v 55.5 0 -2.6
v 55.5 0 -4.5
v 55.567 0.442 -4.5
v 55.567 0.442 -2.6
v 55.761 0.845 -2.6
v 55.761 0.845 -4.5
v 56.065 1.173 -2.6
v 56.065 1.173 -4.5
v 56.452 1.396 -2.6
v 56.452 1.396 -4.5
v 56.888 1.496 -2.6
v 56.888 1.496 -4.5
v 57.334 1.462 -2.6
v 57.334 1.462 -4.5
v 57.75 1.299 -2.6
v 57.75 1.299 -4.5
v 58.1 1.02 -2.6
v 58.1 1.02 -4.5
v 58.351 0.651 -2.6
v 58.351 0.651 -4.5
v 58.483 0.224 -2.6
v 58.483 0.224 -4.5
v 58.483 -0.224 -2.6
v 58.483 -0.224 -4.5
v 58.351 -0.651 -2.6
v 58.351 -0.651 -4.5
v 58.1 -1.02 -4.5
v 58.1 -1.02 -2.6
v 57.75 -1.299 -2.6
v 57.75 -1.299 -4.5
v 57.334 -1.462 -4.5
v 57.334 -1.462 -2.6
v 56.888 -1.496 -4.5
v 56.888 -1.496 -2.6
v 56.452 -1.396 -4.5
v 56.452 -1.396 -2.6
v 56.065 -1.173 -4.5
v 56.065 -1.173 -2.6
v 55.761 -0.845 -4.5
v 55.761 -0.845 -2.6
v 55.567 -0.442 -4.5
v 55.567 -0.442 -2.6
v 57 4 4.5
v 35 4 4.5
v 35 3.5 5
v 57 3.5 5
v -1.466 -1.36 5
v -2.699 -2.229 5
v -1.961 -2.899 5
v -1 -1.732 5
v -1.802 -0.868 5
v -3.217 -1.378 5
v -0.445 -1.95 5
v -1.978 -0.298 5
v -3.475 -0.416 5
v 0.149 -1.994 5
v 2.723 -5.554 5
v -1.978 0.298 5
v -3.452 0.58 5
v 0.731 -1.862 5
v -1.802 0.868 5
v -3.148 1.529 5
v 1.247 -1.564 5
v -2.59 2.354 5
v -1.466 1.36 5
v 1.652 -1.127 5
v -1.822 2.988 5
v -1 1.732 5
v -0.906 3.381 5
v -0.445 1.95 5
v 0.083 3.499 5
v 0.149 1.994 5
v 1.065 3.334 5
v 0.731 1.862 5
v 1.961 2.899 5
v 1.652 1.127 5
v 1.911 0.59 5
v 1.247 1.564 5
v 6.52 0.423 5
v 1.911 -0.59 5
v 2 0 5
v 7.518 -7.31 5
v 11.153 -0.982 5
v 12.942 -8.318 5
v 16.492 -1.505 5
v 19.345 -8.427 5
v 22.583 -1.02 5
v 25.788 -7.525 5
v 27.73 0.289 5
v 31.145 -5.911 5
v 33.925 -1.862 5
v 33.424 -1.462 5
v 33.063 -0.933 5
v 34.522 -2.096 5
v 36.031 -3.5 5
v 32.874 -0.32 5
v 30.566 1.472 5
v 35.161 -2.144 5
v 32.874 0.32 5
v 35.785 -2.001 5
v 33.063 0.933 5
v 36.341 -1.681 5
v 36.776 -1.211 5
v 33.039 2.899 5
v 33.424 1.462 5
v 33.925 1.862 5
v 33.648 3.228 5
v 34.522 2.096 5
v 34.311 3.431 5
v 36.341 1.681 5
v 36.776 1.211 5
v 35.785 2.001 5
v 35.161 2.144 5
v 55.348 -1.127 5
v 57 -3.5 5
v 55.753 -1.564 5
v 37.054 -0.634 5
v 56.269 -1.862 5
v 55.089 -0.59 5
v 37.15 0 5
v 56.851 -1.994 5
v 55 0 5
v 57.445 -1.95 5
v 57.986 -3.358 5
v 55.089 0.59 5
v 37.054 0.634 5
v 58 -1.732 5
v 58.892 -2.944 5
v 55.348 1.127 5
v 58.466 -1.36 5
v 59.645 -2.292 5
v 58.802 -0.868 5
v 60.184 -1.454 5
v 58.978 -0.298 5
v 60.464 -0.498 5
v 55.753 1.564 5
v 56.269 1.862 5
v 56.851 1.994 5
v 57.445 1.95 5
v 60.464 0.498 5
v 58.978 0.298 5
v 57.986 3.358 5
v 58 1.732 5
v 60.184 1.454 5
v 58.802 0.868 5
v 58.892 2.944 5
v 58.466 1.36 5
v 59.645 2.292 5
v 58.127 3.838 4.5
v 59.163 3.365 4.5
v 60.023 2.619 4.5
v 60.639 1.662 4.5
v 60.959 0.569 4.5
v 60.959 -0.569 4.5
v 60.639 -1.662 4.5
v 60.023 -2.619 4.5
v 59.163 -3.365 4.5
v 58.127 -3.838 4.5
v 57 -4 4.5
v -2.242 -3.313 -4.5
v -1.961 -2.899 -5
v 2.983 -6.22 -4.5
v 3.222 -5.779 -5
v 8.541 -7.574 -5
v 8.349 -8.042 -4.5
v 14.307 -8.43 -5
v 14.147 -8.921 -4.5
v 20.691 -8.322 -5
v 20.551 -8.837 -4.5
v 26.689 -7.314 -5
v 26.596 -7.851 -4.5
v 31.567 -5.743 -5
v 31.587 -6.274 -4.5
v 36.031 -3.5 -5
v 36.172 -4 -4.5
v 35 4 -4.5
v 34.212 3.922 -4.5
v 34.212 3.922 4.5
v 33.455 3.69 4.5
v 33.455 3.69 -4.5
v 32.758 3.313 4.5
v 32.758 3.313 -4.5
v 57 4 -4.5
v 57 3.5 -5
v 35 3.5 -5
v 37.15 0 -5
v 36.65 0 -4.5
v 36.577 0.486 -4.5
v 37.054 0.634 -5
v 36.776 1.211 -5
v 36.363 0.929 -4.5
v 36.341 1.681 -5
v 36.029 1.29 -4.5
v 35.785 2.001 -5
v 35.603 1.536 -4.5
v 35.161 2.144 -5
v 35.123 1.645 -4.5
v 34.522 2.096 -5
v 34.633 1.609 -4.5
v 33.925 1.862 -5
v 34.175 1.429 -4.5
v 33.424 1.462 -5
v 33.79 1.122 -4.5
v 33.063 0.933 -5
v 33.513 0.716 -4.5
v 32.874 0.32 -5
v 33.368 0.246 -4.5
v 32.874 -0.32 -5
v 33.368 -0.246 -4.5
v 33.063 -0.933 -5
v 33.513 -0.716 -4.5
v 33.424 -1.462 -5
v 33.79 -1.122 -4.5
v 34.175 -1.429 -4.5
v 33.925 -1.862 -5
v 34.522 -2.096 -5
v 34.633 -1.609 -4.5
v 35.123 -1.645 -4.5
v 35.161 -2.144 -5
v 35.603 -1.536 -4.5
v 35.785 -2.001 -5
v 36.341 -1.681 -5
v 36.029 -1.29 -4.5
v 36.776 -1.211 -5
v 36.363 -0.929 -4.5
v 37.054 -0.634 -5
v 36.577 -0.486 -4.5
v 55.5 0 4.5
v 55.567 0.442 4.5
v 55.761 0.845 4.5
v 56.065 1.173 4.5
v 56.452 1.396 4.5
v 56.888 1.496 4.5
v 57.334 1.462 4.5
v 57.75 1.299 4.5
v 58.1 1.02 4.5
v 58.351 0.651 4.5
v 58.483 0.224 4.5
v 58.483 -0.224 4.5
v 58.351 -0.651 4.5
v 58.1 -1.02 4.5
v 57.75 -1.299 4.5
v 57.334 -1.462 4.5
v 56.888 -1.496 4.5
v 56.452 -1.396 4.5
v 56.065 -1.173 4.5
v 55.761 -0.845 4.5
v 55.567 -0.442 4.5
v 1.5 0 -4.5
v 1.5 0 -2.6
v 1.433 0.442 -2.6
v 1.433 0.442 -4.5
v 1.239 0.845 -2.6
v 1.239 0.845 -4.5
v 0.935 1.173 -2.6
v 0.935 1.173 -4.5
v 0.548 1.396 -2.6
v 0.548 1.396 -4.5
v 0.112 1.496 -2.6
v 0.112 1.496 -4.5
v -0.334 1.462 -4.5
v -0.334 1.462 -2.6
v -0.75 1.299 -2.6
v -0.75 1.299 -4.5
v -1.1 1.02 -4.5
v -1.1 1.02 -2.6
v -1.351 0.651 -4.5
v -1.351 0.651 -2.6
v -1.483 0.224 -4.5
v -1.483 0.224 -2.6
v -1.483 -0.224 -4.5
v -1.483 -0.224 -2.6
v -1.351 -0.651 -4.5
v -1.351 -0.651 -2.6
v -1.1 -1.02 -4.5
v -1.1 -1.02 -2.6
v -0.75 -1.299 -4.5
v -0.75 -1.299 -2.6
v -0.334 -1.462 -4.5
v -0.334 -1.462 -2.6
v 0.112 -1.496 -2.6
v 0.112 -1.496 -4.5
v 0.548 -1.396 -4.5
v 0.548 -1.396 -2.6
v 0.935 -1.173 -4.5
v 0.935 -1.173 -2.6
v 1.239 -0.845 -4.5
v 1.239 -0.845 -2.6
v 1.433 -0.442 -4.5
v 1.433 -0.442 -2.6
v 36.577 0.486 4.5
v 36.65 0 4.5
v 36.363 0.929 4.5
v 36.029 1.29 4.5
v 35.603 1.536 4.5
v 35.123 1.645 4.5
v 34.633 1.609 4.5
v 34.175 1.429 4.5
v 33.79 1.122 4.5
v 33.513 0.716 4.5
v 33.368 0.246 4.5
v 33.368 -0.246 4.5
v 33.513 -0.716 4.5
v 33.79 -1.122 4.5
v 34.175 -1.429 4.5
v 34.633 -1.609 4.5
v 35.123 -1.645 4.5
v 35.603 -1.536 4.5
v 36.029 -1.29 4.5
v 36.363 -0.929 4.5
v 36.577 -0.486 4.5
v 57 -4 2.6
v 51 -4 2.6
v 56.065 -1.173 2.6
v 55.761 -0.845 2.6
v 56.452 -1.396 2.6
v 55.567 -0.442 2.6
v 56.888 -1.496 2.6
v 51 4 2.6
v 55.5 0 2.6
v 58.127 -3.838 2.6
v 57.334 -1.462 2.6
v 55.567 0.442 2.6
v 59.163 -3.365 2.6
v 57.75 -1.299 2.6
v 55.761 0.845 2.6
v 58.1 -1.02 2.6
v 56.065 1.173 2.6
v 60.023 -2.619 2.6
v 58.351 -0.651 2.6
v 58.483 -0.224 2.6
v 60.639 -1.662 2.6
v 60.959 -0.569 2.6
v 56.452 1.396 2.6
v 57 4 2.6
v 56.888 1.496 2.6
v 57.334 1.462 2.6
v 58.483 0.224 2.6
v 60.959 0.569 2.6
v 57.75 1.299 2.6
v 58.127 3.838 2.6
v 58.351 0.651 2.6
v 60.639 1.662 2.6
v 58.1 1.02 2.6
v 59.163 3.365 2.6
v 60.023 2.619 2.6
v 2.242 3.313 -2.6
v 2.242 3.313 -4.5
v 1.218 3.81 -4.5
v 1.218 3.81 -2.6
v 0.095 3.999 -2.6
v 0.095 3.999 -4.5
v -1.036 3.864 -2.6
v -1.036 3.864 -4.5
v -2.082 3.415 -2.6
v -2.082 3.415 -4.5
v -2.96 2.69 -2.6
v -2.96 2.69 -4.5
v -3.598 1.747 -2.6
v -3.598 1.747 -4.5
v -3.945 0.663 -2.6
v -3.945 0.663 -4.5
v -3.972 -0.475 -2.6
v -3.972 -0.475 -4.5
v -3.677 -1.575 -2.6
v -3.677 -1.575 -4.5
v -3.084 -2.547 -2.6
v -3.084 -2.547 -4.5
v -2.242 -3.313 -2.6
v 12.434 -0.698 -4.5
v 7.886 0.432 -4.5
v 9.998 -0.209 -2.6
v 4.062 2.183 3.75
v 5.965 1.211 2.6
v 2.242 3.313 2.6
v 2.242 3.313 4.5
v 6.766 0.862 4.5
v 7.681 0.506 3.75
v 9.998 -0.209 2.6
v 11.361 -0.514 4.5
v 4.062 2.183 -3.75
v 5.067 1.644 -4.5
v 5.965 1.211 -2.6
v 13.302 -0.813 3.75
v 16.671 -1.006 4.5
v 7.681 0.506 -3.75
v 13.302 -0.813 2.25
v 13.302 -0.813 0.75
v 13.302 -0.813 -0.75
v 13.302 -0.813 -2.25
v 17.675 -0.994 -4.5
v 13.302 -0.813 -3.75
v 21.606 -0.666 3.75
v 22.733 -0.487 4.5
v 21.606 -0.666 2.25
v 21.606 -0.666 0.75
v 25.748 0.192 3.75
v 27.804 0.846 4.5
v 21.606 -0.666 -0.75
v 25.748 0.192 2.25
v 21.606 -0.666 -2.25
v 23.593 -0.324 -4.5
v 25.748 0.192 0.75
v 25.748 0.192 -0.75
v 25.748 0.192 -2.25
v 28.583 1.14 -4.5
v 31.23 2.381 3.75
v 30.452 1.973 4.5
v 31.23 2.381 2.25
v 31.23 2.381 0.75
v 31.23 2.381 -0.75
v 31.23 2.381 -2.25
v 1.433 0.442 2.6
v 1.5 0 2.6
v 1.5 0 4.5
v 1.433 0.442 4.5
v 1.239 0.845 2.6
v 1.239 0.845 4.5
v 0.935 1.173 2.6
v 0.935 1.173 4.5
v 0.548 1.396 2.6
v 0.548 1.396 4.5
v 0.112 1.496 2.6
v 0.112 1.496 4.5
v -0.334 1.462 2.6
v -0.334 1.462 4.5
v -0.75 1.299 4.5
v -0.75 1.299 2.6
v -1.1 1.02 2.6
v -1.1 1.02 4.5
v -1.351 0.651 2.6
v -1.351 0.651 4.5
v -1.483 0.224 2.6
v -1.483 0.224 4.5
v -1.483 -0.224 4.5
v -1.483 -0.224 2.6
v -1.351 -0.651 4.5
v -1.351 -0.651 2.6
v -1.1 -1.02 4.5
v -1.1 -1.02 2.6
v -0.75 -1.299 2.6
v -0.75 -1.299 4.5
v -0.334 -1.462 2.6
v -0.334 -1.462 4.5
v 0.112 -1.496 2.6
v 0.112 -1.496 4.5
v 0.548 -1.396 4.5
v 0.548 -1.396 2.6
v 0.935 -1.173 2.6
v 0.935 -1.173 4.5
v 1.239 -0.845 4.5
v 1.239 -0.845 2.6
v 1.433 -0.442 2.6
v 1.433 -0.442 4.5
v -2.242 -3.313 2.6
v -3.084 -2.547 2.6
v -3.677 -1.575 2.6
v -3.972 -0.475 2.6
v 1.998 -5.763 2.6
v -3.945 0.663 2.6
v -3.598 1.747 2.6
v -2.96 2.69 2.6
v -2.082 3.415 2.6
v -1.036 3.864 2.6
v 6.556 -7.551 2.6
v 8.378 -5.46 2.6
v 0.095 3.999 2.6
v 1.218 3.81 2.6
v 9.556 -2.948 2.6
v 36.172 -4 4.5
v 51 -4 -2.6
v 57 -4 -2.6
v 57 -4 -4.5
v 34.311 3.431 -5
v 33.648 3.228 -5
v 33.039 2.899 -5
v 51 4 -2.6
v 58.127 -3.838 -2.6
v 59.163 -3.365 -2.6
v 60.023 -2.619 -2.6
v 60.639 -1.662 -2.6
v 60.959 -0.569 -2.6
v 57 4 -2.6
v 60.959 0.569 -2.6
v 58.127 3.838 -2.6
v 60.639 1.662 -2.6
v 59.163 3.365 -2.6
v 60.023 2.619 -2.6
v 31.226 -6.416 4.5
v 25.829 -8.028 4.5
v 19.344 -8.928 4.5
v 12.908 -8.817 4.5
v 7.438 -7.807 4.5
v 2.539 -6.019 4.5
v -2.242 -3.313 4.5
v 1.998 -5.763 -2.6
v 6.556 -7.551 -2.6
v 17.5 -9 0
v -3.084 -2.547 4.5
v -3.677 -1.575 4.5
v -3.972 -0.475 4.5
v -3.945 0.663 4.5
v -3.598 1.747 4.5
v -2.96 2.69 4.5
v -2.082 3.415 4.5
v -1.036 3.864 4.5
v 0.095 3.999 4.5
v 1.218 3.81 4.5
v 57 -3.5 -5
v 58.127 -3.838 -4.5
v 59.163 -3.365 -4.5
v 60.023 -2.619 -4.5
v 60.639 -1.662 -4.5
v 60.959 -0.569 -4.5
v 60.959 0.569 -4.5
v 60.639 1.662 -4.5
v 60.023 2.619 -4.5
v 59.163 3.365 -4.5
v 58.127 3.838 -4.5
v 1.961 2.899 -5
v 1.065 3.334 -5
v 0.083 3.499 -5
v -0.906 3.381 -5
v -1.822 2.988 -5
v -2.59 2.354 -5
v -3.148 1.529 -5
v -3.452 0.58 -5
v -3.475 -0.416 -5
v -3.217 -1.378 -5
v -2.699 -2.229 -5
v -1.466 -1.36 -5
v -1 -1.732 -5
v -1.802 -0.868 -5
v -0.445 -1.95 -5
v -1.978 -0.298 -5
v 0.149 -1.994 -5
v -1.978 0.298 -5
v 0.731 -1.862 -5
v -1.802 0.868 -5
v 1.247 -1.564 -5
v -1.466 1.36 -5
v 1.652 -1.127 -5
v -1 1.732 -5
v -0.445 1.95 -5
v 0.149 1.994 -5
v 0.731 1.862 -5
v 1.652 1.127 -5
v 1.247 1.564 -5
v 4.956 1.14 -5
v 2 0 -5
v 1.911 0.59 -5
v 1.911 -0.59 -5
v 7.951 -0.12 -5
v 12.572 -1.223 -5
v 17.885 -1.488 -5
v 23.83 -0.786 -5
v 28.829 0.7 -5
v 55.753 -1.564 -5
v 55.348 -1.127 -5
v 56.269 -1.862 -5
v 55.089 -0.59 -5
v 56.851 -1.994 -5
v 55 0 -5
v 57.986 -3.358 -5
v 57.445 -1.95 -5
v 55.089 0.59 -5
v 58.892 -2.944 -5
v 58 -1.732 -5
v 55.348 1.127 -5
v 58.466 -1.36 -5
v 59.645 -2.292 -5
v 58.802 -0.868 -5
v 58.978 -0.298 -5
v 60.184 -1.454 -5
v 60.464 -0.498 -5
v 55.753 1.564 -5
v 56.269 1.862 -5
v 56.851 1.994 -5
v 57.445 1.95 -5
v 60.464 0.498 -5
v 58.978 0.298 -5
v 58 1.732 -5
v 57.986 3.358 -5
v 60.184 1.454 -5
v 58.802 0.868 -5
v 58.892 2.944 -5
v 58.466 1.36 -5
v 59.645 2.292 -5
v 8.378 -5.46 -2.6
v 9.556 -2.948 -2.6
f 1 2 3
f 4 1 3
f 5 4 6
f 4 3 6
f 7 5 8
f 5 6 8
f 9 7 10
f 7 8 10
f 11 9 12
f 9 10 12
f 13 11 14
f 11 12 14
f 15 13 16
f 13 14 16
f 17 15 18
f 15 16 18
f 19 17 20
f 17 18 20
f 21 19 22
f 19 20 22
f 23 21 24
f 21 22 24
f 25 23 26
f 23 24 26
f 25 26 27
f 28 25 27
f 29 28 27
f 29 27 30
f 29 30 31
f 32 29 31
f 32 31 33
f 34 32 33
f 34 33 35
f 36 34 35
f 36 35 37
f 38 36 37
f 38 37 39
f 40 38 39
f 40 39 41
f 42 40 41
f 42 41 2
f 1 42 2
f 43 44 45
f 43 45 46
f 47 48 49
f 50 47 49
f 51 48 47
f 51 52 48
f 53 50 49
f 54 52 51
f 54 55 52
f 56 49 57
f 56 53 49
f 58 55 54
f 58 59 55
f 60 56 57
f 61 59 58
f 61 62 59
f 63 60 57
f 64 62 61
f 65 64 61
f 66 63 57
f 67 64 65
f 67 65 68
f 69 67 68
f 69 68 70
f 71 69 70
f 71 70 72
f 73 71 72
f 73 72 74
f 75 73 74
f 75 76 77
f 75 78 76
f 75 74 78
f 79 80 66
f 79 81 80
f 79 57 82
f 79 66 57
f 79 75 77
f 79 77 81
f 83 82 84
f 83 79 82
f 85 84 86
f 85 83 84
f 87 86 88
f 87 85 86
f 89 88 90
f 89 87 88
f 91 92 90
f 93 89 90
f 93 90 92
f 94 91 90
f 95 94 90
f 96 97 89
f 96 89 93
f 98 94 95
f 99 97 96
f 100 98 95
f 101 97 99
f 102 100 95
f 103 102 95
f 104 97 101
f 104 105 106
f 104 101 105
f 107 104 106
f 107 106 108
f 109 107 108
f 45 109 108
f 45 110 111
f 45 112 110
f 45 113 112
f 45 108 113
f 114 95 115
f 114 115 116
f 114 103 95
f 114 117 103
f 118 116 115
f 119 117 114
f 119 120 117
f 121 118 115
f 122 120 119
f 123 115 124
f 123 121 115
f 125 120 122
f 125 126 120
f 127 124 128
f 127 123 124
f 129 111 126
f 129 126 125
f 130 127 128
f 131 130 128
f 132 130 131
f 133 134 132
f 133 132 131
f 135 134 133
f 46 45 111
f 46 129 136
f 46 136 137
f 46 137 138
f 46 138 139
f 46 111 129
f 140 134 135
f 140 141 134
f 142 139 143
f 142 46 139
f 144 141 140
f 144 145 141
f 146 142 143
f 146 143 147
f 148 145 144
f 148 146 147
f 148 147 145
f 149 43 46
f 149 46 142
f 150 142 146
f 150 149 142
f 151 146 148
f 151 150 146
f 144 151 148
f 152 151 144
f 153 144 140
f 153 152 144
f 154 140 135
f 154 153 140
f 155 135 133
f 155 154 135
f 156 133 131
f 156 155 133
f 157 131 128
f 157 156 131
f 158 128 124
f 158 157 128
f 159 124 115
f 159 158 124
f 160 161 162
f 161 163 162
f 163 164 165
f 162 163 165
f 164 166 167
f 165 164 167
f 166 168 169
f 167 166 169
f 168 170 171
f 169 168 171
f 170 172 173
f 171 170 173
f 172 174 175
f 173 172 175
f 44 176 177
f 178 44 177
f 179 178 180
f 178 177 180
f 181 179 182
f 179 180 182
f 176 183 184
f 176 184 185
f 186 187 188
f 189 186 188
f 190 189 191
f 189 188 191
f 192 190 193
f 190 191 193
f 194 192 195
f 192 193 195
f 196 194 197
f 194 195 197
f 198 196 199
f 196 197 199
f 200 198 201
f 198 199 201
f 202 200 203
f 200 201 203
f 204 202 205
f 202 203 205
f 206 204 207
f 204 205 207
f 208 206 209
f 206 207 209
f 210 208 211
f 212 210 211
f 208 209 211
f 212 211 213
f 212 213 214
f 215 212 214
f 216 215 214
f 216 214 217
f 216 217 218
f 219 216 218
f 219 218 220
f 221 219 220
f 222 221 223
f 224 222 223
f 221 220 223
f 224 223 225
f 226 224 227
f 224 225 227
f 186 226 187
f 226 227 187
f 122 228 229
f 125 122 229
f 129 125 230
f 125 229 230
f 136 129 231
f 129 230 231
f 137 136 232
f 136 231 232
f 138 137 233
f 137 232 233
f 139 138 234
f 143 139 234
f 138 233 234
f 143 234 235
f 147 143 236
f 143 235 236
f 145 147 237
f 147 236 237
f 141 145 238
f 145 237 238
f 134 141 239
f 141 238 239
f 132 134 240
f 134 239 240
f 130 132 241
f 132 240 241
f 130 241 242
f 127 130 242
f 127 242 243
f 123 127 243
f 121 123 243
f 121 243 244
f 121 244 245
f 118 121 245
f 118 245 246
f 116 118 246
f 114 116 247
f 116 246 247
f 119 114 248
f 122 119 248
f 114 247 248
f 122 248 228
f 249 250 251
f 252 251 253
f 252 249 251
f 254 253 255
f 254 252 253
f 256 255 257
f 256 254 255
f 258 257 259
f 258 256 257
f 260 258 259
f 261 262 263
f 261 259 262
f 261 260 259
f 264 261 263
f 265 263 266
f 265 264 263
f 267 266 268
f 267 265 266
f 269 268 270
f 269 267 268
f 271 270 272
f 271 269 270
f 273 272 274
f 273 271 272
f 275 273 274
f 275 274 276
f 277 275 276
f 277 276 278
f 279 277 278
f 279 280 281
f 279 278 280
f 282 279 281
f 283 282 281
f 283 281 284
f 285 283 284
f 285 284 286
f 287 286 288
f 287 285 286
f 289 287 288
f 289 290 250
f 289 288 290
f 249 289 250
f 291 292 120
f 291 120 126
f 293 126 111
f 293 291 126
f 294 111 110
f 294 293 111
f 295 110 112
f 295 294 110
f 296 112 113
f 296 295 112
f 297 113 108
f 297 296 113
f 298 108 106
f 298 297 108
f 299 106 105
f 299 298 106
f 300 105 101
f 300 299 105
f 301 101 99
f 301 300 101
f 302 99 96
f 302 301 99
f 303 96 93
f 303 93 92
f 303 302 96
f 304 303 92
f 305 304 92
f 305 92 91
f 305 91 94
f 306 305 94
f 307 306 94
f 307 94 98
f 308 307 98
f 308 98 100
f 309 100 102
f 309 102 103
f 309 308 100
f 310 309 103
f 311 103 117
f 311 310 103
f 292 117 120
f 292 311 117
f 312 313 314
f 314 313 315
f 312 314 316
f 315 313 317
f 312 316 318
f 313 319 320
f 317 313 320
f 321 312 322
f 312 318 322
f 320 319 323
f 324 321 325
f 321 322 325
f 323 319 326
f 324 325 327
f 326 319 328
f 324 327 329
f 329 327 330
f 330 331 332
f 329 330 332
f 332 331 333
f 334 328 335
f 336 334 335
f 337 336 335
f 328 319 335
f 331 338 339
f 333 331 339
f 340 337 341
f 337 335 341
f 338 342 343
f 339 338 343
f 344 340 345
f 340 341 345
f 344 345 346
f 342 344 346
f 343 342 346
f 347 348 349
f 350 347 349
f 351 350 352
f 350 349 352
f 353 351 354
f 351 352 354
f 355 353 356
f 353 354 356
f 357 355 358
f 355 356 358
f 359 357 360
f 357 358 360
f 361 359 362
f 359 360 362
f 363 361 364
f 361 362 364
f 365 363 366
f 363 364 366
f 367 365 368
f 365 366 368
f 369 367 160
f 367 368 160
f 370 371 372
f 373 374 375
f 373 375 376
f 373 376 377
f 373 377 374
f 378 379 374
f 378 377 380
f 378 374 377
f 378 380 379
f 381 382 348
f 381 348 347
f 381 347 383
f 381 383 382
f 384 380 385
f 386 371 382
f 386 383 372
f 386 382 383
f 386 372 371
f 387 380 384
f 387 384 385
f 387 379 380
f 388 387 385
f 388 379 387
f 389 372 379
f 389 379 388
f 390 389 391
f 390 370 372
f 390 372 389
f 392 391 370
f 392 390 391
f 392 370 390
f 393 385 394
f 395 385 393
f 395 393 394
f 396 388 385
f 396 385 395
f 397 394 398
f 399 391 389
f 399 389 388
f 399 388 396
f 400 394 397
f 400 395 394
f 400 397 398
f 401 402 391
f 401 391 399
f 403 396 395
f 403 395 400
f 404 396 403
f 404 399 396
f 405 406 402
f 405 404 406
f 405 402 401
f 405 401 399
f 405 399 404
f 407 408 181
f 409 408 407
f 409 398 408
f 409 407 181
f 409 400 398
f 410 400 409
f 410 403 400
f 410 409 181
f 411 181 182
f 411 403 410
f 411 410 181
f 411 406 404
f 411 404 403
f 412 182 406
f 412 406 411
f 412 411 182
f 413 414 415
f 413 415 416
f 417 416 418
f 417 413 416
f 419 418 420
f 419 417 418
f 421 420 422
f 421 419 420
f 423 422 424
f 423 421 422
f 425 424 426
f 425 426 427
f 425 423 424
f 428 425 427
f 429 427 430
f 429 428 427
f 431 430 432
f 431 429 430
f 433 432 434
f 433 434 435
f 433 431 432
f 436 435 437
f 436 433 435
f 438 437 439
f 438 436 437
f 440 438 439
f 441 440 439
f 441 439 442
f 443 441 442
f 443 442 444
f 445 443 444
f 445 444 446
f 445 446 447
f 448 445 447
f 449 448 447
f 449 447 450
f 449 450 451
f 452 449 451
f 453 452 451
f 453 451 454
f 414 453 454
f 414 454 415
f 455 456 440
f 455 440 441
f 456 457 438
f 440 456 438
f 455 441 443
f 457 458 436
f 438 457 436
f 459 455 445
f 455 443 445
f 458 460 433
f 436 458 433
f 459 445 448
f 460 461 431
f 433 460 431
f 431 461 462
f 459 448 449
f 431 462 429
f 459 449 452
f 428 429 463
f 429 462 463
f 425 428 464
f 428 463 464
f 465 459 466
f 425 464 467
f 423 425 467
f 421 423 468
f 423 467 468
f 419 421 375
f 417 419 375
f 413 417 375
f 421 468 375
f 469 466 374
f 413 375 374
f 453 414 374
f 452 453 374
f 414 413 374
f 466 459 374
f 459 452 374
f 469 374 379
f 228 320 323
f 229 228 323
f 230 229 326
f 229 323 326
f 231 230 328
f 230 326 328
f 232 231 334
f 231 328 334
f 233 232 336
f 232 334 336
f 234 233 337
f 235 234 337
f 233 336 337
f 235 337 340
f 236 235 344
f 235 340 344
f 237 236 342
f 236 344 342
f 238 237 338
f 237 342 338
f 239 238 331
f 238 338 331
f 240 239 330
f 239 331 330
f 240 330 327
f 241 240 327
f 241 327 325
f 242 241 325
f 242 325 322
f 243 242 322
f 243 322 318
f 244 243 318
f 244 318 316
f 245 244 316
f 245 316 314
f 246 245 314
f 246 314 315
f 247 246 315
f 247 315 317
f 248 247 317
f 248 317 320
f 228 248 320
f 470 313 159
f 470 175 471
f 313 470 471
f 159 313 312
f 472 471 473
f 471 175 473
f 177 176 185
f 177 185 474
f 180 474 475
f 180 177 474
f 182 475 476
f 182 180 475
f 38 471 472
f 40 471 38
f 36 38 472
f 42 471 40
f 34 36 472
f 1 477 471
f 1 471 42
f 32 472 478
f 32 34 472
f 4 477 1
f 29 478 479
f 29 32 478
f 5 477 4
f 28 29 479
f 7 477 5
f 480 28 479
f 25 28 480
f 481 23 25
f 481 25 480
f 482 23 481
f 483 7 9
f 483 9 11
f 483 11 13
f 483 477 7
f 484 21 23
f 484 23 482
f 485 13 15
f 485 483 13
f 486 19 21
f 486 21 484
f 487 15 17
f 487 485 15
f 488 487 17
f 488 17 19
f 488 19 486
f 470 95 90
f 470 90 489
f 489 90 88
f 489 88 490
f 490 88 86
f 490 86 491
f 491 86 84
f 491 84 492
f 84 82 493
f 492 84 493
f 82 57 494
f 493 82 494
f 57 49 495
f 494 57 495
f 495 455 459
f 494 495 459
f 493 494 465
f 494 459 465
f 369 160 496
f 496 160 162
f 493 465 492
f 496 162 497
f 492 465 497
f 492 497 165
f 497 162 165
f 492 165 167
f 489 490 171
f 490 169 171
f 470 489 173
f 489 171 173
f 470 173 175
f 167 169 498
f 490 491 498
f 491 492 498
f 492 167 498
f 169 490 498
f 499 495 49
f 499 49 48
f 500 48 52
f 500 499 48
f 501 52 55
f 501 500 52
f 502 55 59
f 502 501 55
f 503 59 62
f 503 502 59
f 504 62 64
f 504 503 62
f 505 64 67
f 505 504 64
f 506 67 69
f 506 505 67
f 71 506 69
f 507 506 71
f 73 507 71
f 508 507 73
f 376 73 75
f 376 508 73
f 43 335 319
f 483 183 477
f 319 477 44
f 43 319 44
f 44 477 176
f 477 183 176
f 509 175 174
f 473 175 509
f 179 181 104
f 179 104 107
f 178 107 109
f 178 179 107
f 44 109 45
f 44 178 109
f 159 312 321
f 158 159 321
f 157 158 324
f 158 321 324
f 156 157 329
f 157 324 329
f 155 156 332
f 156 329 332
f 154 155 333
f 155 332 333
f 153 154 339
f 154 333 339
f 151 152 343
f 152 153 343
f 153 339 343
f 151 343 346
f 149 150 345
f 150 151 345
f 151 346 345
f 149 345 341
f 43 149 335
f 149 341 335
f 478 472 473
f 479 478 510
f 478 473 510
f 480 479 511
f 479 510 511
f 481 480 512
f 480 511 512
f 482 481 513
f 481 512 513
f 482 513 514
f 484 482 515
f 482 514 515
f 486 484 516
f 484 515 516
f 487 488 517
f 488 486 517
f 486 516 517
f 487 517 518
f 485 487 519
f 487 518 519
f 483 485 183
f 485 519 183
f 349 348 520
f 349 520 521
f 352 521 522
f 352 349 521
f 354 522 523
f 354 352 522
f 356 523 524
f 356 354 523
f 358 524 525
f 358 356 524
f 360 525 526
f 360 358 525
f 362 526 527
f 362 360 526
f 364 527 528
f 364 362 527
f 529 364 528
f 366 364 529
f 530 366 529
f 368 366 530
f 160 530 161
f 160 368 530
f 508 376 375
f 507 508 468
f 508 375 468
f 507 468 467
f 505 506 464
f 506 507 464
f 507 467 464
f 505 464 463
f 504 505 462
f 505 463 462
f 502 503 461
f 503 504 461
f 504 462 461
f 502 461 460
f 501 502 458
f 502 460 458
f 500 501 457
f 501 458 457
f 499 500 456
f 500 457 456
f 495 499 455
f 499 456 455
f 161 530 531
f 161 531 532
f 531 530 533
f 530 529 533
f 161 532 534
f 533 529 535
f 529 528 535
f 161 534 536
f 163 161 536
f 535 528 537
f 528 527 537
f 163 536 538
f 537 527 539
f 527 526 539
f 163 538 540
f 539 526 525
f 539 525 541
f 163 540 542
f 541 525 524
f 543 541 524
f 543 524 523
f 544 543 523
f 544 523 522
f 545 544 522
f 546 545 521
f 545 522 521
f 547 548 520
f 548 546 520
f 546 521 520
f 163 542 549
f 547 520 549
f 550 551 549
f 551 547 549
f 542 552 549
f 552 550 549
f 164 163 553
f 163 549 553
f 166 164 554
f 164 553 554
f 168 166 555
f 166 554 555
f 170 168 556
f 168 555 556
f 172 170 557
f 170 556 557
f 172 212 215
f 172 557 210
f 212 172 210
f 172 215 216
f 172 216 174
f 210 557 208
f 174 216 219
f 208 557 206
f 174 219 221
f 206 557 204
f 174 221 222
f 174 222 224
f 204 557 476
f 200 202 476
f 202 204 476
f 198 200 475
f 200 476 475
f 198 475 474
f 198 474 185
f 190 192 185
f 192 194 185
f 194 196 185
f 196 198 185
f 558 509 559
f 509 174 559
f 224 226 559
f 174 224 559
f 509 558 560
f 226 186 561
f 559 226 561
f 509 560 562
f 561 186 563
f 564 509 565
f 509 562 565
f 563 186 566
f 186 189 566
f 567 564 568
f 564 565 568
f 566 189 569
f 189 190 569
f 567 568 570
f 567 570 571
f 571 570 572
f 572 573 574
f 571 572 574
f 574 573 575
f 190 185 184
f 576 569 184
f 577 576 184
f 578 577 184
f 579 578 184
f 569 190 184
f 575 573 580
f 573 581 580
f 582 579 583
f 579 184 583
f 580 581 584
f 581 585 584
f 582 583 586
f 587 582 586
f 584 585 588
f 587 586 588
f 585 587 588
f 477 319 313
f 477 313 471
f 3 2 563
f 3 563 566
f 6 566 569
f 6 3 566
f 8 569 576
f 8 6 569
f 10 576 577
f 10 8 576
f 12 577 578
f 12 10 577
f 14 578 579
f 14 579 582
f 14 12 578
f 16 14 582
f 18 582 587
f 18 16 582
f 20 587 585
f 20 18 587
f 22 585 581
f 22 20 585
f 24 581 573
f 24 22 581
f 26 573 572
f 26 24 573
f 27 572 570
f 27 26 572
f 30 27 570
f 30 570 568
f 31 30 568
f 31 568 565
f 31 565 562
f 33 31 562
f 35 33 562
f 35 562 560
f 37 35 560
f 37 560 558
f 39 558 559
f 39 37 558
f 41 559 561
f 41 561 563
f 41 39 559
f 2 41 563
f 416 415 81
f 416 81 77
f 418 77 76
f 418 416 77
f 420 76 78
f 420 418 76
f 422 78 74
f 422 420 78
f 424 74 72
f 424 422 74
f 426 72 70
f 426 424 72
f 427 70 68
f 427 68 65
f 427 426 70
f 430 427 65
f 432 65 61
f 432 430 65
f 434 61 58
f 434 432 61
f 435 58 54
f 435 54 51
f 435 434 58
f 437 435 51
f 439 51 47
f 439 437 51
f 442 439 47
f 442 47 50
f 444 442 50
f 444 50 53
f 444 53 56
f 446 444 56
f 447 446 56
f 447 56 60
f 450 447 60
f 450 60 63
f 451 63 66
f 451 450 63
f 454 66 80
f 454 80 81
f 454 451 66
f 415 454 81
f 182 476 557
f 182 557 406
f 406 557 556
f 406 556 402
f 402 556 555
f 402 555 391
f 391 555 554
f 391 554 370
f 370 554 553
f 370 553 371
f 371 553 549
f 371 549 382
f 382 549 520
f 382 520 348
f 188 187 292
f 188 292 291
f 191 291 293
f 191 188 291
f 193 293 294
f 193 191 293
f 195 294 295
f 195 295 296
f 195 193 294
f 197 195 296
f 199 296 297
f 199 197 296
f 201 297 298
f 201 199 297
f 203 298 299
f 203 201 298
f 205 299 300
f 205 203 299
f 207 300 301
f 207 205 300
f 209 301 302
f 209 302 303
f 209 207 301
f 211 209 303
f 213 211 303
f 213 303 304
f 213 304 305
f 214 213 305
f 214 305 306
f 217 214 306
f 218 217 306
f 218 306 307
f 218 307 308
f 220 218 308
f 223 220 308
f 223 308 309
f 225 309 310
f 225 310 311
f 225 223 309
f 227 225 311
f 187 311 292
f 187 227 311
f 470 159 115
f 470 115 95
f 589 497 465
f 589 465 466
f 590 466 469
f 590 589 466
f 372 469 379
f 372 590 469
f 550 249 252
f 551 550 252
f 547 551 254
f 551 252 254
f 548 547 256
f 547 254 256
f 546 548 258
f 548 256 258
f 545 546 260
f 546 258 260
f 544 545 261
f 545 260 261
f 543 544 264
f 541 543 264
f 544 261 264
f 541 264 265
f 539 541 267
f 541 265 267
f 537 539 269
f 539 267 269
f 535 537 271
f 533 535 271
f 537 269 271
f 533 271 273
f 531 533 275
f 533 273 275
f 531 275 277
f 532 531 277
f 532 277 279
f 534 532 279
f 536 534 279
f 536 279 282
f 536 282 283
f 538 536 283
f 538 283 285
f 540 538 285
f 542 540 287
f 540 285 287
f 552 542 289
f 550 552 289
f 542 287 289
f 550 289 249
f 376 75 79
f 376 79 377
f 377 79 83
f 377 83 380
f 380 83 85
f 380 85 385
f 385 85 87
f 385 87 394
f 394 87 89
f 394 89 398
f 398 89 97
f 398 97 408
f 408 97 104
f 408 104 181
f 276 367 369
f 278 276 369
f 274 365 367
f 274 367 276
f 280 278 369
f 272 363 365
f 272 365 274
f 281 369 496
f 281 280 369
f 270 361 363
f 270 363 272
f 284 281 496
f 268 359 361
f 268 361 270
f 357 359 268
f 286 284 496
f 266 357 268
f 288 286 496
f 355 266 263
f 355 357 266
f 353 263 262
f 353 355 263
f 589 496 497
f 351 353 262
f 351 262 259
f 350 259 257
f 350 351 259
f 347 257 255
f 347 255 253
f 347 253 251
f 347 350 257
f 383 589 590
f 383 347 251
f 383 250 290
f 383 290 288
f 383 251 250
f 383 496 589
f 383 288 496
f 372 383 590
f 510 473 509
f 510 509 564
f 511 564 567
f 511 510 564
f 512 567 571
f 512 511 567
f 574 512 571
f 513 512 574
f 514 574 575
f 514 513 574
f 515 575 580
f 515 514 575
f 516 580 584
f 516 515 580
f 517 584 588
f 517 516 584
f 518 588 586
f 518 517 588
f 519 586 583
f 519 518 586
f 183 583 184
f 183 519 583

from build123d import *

# Parameters (mm, degrees)
EXTRUDE_1_DEPTH          = 5
EXTRUDE_1_DEPTH_BACK     = 5
SKETCH_1_R               = 4
SKETCH_1_R_2             = 1.5
SKETCH_1_R_3             = 3.999999999999999
SKETCH_1_R_4             = 1.6500000000000021
CUT_EXTRUDE_1_DEPTH      = 2.6
CUT_EXTRUDE_1_DEPTH_BACK = 2.6
SKETCH_2_R               = 10
SKETCH_3_R               = 1.500000000000004
SKETCH_3_R_2             = 1.6500000000000021
EXTRUDE_3_DEPTH          = 10
SKETCH_4_W               = 20.00000000000002
SKETCH_4_H               = 5.2
CUT_EXTRUDE_2_DEPTH      = 10
CHAMFER_1_SIZE           = 0.5


with BuildPart() as part:
    # 草图1 → 凸台-拉伸1 (new, two sides: drawn at the far end of the back side and taken through both)
    # profile 1 of 3: a face of its own
    with BuildSketch(Plane.XY.offset(-EXTRUDE_1_DEPTH_BACK)):
        Circle(SKETCH_1_R)
        Circle(SKETCH_1_R_2, mode=Mode.SUBTRACT)
    # profile 2 of 3: a face of its own
    with BuildSketch(Plane.XY.offset(-EXTRUDE_1_DEPTH_BACK)):
        with BuildLine():
            ThreePointArc((2.241669254584064, 3.3128415224777243), (3.5331768295923327, 1.8752763771860061), (4, 0))
            ThreePointArc((4, -9.8e-16), (1.875276377186004, -3.533176829592334), (-2.241669254584067, -3.312841522477722))
            add(Edge.make_bspline(
                [(-2.2416692545840666, -3.3128415224777275), (4.023288399104954, -7.552091380419048), (17.137885249639094, -10.692937395333647), (31.700941101616845, -7.062033828913657), (37.24166925458407, -3.3128415224777283)],
                knots=[0, 0, 0, 0, 0.5000000000000002, 1, 1, 1, 1], degree=3))
            ThreePointArc((37.24166925458406, -3.312841522477722), (31.687158477522274, -2.2416692545840604), (32.75833074541594, 3.312841522477726))
            add(Edge.make_bspline(
                [(2.2416692545840613, 3.3128415224777203), (2.5417844094553557, 3.1097654287542427), (3.1567145921113204, 2.711097631998411), (4.363329654695279, 1.996321701251651), (5.869996949507693, 1.2242995538785062), (7.677590875082871, 0.4788920232894552), (10.115405251702699, -0.2996699093227729), (13.252057238449053, -0.9025900818361017), (17.317568666800724, -1.0878092080294735), (21.627918427541044, -0.7536952847930135), (25.807284141658094, 0.1095698053821612), (28.992197069652473, 1.2411094397422888), (31.264365551631894, 2.3695049176779595), (32.264190962280374, 2.9784766119300636), (32.75833074541594, 3.312841522477724)],
                knots=[0, 0, 0, 0, 0.03125, 0.0625, 0.125, 0.1875, 0.25, 0.375, 0.5, 0.625, 0.75, 0.875, 0.9375, 1, 1, 1, 1], degree=3))
        make_face()
    # profile 3 of 3: a face of its own
    with BuildSketch(Plane.XY.offset(-EXTRUDE_1_DEPTH_BACK)):
        with Locations((35, 2.24e-15)):
            Circle(SKETCH_1_R_3)
        with Locations((35, 2.24e-15)):
            Circle(SKETCH_1_R_4, mode=Mode.SUBTRACT)
    extrude(amount=EXTRUDE_1_DEPTH + EXTRUDE_1_DEPTH_BACK)

    # 草图2 → 切除-拉伸1 (cut, two sides: drawn at the far end of the back side and taken through both)
    with BuildSketch(Plane.XY.offset(-CUT_EXTRUDE_1_DEPTH_BACK)):
        Circle(SKETCH_2_R)
    extrude(amount=CUT_EXTRUDE_1_DEPTH + CUT_EXTRUDE_1_DEPTH_BACK, mode=Mode.SUBTRACT)

    # 草图3 → 凸台-拉伸3 (add)
    with BuildSketch(Plane(origin=(0, 0, -5), x_dir=(-1, 0, 0), z_dir=(0, 0, -1))):
        with BuildLine():
            Line((-57, 3.9999999999999947), (-35, 4.000000000000001))
            ThreePointArc((-35, 4.000000000000001), (-31.000000000000004, 2.24e-15), (-35, -3.9999999999999956))
            Line((-35, -3.9999999999999956), (-57, -3.9999999999999947))
            ThreePointArc((-57, -3.9999999999999947), (-61, -2.2e-15), (-57, 3.9999999999999947))
        make_face()
        with Locations((-57, -2.69e-15)):
            Circle(SKETCH_3_R, mode=Mode.SUBTRACT)
        with Locations(Location((-35, 2.24e-15, 0), (0, 0, 180))):
            Circle(SKETCH_3_R_2, mode=Mode.SUBTRACT)
    extrude(amount=-EXTRUDE_3_DEPTH)

    # 草图4 → 切除-拉伸2 (cut)
    with BuildSketch(Plane(origin=(1.1e-15, 4.000000000000011, 0), x_dir=(1, -2.8e-16, 0), z_dir=(2.8e-16, 1, 0))):
        with Locations((61.000000000000014, 0)):
            Rectangle(SKETCH_4_W, SKETCH_4_H)
    extrude(amount=-CUT_EXTRUDE_2_DEPTH, mode=Mode.SUBTRACT)

    # 倒角1
    chamfer_1_edges = [part.edges().sort_by_distance(p)[0] for p in [
        (58.50000000000001, -2.51e-15, -5),
        (58.50000000000001, -2.51e-15, 5),
        (33.349999999999994, 1.71e-15, 5),
        (-1.5, 1.8e-16, 5),
        (-1.5, 1.8e-16, -5),
        (33.349999999999994, 1.71e-15, -5),
        (17.466337621201156, -0.999163570519443, 5),
        (-3.3128415224777235, 2.2416692545840653, 5),
        (17.466337621201156, -0.999163570519443, 5),
        (46.58588320296925, -3.999999999999995, 5),
        (46.58588320296925, -3.999999999999995, -5),
        (33.82768734757124, 3.824353938243094, 5),
        (61, -2e-17, -5),
        (61, -2e-17, 5),
        (46, 3.999999999999998, -5),
        (46, 3.999999999999998, 5),
        (17.466337621201156, -0.999163570519443, -5),
        (-3.3128415224777235, 2.2416692545840653, -5),
        (33.82768734757124, 3.8243539382430947, -5),
        (17.466337621201156, -0.999163570519443, -5),
    ]]
    chamfer(chamfer_1_edges, length=CHAMFER_1_SIZE)


solid = part.part
